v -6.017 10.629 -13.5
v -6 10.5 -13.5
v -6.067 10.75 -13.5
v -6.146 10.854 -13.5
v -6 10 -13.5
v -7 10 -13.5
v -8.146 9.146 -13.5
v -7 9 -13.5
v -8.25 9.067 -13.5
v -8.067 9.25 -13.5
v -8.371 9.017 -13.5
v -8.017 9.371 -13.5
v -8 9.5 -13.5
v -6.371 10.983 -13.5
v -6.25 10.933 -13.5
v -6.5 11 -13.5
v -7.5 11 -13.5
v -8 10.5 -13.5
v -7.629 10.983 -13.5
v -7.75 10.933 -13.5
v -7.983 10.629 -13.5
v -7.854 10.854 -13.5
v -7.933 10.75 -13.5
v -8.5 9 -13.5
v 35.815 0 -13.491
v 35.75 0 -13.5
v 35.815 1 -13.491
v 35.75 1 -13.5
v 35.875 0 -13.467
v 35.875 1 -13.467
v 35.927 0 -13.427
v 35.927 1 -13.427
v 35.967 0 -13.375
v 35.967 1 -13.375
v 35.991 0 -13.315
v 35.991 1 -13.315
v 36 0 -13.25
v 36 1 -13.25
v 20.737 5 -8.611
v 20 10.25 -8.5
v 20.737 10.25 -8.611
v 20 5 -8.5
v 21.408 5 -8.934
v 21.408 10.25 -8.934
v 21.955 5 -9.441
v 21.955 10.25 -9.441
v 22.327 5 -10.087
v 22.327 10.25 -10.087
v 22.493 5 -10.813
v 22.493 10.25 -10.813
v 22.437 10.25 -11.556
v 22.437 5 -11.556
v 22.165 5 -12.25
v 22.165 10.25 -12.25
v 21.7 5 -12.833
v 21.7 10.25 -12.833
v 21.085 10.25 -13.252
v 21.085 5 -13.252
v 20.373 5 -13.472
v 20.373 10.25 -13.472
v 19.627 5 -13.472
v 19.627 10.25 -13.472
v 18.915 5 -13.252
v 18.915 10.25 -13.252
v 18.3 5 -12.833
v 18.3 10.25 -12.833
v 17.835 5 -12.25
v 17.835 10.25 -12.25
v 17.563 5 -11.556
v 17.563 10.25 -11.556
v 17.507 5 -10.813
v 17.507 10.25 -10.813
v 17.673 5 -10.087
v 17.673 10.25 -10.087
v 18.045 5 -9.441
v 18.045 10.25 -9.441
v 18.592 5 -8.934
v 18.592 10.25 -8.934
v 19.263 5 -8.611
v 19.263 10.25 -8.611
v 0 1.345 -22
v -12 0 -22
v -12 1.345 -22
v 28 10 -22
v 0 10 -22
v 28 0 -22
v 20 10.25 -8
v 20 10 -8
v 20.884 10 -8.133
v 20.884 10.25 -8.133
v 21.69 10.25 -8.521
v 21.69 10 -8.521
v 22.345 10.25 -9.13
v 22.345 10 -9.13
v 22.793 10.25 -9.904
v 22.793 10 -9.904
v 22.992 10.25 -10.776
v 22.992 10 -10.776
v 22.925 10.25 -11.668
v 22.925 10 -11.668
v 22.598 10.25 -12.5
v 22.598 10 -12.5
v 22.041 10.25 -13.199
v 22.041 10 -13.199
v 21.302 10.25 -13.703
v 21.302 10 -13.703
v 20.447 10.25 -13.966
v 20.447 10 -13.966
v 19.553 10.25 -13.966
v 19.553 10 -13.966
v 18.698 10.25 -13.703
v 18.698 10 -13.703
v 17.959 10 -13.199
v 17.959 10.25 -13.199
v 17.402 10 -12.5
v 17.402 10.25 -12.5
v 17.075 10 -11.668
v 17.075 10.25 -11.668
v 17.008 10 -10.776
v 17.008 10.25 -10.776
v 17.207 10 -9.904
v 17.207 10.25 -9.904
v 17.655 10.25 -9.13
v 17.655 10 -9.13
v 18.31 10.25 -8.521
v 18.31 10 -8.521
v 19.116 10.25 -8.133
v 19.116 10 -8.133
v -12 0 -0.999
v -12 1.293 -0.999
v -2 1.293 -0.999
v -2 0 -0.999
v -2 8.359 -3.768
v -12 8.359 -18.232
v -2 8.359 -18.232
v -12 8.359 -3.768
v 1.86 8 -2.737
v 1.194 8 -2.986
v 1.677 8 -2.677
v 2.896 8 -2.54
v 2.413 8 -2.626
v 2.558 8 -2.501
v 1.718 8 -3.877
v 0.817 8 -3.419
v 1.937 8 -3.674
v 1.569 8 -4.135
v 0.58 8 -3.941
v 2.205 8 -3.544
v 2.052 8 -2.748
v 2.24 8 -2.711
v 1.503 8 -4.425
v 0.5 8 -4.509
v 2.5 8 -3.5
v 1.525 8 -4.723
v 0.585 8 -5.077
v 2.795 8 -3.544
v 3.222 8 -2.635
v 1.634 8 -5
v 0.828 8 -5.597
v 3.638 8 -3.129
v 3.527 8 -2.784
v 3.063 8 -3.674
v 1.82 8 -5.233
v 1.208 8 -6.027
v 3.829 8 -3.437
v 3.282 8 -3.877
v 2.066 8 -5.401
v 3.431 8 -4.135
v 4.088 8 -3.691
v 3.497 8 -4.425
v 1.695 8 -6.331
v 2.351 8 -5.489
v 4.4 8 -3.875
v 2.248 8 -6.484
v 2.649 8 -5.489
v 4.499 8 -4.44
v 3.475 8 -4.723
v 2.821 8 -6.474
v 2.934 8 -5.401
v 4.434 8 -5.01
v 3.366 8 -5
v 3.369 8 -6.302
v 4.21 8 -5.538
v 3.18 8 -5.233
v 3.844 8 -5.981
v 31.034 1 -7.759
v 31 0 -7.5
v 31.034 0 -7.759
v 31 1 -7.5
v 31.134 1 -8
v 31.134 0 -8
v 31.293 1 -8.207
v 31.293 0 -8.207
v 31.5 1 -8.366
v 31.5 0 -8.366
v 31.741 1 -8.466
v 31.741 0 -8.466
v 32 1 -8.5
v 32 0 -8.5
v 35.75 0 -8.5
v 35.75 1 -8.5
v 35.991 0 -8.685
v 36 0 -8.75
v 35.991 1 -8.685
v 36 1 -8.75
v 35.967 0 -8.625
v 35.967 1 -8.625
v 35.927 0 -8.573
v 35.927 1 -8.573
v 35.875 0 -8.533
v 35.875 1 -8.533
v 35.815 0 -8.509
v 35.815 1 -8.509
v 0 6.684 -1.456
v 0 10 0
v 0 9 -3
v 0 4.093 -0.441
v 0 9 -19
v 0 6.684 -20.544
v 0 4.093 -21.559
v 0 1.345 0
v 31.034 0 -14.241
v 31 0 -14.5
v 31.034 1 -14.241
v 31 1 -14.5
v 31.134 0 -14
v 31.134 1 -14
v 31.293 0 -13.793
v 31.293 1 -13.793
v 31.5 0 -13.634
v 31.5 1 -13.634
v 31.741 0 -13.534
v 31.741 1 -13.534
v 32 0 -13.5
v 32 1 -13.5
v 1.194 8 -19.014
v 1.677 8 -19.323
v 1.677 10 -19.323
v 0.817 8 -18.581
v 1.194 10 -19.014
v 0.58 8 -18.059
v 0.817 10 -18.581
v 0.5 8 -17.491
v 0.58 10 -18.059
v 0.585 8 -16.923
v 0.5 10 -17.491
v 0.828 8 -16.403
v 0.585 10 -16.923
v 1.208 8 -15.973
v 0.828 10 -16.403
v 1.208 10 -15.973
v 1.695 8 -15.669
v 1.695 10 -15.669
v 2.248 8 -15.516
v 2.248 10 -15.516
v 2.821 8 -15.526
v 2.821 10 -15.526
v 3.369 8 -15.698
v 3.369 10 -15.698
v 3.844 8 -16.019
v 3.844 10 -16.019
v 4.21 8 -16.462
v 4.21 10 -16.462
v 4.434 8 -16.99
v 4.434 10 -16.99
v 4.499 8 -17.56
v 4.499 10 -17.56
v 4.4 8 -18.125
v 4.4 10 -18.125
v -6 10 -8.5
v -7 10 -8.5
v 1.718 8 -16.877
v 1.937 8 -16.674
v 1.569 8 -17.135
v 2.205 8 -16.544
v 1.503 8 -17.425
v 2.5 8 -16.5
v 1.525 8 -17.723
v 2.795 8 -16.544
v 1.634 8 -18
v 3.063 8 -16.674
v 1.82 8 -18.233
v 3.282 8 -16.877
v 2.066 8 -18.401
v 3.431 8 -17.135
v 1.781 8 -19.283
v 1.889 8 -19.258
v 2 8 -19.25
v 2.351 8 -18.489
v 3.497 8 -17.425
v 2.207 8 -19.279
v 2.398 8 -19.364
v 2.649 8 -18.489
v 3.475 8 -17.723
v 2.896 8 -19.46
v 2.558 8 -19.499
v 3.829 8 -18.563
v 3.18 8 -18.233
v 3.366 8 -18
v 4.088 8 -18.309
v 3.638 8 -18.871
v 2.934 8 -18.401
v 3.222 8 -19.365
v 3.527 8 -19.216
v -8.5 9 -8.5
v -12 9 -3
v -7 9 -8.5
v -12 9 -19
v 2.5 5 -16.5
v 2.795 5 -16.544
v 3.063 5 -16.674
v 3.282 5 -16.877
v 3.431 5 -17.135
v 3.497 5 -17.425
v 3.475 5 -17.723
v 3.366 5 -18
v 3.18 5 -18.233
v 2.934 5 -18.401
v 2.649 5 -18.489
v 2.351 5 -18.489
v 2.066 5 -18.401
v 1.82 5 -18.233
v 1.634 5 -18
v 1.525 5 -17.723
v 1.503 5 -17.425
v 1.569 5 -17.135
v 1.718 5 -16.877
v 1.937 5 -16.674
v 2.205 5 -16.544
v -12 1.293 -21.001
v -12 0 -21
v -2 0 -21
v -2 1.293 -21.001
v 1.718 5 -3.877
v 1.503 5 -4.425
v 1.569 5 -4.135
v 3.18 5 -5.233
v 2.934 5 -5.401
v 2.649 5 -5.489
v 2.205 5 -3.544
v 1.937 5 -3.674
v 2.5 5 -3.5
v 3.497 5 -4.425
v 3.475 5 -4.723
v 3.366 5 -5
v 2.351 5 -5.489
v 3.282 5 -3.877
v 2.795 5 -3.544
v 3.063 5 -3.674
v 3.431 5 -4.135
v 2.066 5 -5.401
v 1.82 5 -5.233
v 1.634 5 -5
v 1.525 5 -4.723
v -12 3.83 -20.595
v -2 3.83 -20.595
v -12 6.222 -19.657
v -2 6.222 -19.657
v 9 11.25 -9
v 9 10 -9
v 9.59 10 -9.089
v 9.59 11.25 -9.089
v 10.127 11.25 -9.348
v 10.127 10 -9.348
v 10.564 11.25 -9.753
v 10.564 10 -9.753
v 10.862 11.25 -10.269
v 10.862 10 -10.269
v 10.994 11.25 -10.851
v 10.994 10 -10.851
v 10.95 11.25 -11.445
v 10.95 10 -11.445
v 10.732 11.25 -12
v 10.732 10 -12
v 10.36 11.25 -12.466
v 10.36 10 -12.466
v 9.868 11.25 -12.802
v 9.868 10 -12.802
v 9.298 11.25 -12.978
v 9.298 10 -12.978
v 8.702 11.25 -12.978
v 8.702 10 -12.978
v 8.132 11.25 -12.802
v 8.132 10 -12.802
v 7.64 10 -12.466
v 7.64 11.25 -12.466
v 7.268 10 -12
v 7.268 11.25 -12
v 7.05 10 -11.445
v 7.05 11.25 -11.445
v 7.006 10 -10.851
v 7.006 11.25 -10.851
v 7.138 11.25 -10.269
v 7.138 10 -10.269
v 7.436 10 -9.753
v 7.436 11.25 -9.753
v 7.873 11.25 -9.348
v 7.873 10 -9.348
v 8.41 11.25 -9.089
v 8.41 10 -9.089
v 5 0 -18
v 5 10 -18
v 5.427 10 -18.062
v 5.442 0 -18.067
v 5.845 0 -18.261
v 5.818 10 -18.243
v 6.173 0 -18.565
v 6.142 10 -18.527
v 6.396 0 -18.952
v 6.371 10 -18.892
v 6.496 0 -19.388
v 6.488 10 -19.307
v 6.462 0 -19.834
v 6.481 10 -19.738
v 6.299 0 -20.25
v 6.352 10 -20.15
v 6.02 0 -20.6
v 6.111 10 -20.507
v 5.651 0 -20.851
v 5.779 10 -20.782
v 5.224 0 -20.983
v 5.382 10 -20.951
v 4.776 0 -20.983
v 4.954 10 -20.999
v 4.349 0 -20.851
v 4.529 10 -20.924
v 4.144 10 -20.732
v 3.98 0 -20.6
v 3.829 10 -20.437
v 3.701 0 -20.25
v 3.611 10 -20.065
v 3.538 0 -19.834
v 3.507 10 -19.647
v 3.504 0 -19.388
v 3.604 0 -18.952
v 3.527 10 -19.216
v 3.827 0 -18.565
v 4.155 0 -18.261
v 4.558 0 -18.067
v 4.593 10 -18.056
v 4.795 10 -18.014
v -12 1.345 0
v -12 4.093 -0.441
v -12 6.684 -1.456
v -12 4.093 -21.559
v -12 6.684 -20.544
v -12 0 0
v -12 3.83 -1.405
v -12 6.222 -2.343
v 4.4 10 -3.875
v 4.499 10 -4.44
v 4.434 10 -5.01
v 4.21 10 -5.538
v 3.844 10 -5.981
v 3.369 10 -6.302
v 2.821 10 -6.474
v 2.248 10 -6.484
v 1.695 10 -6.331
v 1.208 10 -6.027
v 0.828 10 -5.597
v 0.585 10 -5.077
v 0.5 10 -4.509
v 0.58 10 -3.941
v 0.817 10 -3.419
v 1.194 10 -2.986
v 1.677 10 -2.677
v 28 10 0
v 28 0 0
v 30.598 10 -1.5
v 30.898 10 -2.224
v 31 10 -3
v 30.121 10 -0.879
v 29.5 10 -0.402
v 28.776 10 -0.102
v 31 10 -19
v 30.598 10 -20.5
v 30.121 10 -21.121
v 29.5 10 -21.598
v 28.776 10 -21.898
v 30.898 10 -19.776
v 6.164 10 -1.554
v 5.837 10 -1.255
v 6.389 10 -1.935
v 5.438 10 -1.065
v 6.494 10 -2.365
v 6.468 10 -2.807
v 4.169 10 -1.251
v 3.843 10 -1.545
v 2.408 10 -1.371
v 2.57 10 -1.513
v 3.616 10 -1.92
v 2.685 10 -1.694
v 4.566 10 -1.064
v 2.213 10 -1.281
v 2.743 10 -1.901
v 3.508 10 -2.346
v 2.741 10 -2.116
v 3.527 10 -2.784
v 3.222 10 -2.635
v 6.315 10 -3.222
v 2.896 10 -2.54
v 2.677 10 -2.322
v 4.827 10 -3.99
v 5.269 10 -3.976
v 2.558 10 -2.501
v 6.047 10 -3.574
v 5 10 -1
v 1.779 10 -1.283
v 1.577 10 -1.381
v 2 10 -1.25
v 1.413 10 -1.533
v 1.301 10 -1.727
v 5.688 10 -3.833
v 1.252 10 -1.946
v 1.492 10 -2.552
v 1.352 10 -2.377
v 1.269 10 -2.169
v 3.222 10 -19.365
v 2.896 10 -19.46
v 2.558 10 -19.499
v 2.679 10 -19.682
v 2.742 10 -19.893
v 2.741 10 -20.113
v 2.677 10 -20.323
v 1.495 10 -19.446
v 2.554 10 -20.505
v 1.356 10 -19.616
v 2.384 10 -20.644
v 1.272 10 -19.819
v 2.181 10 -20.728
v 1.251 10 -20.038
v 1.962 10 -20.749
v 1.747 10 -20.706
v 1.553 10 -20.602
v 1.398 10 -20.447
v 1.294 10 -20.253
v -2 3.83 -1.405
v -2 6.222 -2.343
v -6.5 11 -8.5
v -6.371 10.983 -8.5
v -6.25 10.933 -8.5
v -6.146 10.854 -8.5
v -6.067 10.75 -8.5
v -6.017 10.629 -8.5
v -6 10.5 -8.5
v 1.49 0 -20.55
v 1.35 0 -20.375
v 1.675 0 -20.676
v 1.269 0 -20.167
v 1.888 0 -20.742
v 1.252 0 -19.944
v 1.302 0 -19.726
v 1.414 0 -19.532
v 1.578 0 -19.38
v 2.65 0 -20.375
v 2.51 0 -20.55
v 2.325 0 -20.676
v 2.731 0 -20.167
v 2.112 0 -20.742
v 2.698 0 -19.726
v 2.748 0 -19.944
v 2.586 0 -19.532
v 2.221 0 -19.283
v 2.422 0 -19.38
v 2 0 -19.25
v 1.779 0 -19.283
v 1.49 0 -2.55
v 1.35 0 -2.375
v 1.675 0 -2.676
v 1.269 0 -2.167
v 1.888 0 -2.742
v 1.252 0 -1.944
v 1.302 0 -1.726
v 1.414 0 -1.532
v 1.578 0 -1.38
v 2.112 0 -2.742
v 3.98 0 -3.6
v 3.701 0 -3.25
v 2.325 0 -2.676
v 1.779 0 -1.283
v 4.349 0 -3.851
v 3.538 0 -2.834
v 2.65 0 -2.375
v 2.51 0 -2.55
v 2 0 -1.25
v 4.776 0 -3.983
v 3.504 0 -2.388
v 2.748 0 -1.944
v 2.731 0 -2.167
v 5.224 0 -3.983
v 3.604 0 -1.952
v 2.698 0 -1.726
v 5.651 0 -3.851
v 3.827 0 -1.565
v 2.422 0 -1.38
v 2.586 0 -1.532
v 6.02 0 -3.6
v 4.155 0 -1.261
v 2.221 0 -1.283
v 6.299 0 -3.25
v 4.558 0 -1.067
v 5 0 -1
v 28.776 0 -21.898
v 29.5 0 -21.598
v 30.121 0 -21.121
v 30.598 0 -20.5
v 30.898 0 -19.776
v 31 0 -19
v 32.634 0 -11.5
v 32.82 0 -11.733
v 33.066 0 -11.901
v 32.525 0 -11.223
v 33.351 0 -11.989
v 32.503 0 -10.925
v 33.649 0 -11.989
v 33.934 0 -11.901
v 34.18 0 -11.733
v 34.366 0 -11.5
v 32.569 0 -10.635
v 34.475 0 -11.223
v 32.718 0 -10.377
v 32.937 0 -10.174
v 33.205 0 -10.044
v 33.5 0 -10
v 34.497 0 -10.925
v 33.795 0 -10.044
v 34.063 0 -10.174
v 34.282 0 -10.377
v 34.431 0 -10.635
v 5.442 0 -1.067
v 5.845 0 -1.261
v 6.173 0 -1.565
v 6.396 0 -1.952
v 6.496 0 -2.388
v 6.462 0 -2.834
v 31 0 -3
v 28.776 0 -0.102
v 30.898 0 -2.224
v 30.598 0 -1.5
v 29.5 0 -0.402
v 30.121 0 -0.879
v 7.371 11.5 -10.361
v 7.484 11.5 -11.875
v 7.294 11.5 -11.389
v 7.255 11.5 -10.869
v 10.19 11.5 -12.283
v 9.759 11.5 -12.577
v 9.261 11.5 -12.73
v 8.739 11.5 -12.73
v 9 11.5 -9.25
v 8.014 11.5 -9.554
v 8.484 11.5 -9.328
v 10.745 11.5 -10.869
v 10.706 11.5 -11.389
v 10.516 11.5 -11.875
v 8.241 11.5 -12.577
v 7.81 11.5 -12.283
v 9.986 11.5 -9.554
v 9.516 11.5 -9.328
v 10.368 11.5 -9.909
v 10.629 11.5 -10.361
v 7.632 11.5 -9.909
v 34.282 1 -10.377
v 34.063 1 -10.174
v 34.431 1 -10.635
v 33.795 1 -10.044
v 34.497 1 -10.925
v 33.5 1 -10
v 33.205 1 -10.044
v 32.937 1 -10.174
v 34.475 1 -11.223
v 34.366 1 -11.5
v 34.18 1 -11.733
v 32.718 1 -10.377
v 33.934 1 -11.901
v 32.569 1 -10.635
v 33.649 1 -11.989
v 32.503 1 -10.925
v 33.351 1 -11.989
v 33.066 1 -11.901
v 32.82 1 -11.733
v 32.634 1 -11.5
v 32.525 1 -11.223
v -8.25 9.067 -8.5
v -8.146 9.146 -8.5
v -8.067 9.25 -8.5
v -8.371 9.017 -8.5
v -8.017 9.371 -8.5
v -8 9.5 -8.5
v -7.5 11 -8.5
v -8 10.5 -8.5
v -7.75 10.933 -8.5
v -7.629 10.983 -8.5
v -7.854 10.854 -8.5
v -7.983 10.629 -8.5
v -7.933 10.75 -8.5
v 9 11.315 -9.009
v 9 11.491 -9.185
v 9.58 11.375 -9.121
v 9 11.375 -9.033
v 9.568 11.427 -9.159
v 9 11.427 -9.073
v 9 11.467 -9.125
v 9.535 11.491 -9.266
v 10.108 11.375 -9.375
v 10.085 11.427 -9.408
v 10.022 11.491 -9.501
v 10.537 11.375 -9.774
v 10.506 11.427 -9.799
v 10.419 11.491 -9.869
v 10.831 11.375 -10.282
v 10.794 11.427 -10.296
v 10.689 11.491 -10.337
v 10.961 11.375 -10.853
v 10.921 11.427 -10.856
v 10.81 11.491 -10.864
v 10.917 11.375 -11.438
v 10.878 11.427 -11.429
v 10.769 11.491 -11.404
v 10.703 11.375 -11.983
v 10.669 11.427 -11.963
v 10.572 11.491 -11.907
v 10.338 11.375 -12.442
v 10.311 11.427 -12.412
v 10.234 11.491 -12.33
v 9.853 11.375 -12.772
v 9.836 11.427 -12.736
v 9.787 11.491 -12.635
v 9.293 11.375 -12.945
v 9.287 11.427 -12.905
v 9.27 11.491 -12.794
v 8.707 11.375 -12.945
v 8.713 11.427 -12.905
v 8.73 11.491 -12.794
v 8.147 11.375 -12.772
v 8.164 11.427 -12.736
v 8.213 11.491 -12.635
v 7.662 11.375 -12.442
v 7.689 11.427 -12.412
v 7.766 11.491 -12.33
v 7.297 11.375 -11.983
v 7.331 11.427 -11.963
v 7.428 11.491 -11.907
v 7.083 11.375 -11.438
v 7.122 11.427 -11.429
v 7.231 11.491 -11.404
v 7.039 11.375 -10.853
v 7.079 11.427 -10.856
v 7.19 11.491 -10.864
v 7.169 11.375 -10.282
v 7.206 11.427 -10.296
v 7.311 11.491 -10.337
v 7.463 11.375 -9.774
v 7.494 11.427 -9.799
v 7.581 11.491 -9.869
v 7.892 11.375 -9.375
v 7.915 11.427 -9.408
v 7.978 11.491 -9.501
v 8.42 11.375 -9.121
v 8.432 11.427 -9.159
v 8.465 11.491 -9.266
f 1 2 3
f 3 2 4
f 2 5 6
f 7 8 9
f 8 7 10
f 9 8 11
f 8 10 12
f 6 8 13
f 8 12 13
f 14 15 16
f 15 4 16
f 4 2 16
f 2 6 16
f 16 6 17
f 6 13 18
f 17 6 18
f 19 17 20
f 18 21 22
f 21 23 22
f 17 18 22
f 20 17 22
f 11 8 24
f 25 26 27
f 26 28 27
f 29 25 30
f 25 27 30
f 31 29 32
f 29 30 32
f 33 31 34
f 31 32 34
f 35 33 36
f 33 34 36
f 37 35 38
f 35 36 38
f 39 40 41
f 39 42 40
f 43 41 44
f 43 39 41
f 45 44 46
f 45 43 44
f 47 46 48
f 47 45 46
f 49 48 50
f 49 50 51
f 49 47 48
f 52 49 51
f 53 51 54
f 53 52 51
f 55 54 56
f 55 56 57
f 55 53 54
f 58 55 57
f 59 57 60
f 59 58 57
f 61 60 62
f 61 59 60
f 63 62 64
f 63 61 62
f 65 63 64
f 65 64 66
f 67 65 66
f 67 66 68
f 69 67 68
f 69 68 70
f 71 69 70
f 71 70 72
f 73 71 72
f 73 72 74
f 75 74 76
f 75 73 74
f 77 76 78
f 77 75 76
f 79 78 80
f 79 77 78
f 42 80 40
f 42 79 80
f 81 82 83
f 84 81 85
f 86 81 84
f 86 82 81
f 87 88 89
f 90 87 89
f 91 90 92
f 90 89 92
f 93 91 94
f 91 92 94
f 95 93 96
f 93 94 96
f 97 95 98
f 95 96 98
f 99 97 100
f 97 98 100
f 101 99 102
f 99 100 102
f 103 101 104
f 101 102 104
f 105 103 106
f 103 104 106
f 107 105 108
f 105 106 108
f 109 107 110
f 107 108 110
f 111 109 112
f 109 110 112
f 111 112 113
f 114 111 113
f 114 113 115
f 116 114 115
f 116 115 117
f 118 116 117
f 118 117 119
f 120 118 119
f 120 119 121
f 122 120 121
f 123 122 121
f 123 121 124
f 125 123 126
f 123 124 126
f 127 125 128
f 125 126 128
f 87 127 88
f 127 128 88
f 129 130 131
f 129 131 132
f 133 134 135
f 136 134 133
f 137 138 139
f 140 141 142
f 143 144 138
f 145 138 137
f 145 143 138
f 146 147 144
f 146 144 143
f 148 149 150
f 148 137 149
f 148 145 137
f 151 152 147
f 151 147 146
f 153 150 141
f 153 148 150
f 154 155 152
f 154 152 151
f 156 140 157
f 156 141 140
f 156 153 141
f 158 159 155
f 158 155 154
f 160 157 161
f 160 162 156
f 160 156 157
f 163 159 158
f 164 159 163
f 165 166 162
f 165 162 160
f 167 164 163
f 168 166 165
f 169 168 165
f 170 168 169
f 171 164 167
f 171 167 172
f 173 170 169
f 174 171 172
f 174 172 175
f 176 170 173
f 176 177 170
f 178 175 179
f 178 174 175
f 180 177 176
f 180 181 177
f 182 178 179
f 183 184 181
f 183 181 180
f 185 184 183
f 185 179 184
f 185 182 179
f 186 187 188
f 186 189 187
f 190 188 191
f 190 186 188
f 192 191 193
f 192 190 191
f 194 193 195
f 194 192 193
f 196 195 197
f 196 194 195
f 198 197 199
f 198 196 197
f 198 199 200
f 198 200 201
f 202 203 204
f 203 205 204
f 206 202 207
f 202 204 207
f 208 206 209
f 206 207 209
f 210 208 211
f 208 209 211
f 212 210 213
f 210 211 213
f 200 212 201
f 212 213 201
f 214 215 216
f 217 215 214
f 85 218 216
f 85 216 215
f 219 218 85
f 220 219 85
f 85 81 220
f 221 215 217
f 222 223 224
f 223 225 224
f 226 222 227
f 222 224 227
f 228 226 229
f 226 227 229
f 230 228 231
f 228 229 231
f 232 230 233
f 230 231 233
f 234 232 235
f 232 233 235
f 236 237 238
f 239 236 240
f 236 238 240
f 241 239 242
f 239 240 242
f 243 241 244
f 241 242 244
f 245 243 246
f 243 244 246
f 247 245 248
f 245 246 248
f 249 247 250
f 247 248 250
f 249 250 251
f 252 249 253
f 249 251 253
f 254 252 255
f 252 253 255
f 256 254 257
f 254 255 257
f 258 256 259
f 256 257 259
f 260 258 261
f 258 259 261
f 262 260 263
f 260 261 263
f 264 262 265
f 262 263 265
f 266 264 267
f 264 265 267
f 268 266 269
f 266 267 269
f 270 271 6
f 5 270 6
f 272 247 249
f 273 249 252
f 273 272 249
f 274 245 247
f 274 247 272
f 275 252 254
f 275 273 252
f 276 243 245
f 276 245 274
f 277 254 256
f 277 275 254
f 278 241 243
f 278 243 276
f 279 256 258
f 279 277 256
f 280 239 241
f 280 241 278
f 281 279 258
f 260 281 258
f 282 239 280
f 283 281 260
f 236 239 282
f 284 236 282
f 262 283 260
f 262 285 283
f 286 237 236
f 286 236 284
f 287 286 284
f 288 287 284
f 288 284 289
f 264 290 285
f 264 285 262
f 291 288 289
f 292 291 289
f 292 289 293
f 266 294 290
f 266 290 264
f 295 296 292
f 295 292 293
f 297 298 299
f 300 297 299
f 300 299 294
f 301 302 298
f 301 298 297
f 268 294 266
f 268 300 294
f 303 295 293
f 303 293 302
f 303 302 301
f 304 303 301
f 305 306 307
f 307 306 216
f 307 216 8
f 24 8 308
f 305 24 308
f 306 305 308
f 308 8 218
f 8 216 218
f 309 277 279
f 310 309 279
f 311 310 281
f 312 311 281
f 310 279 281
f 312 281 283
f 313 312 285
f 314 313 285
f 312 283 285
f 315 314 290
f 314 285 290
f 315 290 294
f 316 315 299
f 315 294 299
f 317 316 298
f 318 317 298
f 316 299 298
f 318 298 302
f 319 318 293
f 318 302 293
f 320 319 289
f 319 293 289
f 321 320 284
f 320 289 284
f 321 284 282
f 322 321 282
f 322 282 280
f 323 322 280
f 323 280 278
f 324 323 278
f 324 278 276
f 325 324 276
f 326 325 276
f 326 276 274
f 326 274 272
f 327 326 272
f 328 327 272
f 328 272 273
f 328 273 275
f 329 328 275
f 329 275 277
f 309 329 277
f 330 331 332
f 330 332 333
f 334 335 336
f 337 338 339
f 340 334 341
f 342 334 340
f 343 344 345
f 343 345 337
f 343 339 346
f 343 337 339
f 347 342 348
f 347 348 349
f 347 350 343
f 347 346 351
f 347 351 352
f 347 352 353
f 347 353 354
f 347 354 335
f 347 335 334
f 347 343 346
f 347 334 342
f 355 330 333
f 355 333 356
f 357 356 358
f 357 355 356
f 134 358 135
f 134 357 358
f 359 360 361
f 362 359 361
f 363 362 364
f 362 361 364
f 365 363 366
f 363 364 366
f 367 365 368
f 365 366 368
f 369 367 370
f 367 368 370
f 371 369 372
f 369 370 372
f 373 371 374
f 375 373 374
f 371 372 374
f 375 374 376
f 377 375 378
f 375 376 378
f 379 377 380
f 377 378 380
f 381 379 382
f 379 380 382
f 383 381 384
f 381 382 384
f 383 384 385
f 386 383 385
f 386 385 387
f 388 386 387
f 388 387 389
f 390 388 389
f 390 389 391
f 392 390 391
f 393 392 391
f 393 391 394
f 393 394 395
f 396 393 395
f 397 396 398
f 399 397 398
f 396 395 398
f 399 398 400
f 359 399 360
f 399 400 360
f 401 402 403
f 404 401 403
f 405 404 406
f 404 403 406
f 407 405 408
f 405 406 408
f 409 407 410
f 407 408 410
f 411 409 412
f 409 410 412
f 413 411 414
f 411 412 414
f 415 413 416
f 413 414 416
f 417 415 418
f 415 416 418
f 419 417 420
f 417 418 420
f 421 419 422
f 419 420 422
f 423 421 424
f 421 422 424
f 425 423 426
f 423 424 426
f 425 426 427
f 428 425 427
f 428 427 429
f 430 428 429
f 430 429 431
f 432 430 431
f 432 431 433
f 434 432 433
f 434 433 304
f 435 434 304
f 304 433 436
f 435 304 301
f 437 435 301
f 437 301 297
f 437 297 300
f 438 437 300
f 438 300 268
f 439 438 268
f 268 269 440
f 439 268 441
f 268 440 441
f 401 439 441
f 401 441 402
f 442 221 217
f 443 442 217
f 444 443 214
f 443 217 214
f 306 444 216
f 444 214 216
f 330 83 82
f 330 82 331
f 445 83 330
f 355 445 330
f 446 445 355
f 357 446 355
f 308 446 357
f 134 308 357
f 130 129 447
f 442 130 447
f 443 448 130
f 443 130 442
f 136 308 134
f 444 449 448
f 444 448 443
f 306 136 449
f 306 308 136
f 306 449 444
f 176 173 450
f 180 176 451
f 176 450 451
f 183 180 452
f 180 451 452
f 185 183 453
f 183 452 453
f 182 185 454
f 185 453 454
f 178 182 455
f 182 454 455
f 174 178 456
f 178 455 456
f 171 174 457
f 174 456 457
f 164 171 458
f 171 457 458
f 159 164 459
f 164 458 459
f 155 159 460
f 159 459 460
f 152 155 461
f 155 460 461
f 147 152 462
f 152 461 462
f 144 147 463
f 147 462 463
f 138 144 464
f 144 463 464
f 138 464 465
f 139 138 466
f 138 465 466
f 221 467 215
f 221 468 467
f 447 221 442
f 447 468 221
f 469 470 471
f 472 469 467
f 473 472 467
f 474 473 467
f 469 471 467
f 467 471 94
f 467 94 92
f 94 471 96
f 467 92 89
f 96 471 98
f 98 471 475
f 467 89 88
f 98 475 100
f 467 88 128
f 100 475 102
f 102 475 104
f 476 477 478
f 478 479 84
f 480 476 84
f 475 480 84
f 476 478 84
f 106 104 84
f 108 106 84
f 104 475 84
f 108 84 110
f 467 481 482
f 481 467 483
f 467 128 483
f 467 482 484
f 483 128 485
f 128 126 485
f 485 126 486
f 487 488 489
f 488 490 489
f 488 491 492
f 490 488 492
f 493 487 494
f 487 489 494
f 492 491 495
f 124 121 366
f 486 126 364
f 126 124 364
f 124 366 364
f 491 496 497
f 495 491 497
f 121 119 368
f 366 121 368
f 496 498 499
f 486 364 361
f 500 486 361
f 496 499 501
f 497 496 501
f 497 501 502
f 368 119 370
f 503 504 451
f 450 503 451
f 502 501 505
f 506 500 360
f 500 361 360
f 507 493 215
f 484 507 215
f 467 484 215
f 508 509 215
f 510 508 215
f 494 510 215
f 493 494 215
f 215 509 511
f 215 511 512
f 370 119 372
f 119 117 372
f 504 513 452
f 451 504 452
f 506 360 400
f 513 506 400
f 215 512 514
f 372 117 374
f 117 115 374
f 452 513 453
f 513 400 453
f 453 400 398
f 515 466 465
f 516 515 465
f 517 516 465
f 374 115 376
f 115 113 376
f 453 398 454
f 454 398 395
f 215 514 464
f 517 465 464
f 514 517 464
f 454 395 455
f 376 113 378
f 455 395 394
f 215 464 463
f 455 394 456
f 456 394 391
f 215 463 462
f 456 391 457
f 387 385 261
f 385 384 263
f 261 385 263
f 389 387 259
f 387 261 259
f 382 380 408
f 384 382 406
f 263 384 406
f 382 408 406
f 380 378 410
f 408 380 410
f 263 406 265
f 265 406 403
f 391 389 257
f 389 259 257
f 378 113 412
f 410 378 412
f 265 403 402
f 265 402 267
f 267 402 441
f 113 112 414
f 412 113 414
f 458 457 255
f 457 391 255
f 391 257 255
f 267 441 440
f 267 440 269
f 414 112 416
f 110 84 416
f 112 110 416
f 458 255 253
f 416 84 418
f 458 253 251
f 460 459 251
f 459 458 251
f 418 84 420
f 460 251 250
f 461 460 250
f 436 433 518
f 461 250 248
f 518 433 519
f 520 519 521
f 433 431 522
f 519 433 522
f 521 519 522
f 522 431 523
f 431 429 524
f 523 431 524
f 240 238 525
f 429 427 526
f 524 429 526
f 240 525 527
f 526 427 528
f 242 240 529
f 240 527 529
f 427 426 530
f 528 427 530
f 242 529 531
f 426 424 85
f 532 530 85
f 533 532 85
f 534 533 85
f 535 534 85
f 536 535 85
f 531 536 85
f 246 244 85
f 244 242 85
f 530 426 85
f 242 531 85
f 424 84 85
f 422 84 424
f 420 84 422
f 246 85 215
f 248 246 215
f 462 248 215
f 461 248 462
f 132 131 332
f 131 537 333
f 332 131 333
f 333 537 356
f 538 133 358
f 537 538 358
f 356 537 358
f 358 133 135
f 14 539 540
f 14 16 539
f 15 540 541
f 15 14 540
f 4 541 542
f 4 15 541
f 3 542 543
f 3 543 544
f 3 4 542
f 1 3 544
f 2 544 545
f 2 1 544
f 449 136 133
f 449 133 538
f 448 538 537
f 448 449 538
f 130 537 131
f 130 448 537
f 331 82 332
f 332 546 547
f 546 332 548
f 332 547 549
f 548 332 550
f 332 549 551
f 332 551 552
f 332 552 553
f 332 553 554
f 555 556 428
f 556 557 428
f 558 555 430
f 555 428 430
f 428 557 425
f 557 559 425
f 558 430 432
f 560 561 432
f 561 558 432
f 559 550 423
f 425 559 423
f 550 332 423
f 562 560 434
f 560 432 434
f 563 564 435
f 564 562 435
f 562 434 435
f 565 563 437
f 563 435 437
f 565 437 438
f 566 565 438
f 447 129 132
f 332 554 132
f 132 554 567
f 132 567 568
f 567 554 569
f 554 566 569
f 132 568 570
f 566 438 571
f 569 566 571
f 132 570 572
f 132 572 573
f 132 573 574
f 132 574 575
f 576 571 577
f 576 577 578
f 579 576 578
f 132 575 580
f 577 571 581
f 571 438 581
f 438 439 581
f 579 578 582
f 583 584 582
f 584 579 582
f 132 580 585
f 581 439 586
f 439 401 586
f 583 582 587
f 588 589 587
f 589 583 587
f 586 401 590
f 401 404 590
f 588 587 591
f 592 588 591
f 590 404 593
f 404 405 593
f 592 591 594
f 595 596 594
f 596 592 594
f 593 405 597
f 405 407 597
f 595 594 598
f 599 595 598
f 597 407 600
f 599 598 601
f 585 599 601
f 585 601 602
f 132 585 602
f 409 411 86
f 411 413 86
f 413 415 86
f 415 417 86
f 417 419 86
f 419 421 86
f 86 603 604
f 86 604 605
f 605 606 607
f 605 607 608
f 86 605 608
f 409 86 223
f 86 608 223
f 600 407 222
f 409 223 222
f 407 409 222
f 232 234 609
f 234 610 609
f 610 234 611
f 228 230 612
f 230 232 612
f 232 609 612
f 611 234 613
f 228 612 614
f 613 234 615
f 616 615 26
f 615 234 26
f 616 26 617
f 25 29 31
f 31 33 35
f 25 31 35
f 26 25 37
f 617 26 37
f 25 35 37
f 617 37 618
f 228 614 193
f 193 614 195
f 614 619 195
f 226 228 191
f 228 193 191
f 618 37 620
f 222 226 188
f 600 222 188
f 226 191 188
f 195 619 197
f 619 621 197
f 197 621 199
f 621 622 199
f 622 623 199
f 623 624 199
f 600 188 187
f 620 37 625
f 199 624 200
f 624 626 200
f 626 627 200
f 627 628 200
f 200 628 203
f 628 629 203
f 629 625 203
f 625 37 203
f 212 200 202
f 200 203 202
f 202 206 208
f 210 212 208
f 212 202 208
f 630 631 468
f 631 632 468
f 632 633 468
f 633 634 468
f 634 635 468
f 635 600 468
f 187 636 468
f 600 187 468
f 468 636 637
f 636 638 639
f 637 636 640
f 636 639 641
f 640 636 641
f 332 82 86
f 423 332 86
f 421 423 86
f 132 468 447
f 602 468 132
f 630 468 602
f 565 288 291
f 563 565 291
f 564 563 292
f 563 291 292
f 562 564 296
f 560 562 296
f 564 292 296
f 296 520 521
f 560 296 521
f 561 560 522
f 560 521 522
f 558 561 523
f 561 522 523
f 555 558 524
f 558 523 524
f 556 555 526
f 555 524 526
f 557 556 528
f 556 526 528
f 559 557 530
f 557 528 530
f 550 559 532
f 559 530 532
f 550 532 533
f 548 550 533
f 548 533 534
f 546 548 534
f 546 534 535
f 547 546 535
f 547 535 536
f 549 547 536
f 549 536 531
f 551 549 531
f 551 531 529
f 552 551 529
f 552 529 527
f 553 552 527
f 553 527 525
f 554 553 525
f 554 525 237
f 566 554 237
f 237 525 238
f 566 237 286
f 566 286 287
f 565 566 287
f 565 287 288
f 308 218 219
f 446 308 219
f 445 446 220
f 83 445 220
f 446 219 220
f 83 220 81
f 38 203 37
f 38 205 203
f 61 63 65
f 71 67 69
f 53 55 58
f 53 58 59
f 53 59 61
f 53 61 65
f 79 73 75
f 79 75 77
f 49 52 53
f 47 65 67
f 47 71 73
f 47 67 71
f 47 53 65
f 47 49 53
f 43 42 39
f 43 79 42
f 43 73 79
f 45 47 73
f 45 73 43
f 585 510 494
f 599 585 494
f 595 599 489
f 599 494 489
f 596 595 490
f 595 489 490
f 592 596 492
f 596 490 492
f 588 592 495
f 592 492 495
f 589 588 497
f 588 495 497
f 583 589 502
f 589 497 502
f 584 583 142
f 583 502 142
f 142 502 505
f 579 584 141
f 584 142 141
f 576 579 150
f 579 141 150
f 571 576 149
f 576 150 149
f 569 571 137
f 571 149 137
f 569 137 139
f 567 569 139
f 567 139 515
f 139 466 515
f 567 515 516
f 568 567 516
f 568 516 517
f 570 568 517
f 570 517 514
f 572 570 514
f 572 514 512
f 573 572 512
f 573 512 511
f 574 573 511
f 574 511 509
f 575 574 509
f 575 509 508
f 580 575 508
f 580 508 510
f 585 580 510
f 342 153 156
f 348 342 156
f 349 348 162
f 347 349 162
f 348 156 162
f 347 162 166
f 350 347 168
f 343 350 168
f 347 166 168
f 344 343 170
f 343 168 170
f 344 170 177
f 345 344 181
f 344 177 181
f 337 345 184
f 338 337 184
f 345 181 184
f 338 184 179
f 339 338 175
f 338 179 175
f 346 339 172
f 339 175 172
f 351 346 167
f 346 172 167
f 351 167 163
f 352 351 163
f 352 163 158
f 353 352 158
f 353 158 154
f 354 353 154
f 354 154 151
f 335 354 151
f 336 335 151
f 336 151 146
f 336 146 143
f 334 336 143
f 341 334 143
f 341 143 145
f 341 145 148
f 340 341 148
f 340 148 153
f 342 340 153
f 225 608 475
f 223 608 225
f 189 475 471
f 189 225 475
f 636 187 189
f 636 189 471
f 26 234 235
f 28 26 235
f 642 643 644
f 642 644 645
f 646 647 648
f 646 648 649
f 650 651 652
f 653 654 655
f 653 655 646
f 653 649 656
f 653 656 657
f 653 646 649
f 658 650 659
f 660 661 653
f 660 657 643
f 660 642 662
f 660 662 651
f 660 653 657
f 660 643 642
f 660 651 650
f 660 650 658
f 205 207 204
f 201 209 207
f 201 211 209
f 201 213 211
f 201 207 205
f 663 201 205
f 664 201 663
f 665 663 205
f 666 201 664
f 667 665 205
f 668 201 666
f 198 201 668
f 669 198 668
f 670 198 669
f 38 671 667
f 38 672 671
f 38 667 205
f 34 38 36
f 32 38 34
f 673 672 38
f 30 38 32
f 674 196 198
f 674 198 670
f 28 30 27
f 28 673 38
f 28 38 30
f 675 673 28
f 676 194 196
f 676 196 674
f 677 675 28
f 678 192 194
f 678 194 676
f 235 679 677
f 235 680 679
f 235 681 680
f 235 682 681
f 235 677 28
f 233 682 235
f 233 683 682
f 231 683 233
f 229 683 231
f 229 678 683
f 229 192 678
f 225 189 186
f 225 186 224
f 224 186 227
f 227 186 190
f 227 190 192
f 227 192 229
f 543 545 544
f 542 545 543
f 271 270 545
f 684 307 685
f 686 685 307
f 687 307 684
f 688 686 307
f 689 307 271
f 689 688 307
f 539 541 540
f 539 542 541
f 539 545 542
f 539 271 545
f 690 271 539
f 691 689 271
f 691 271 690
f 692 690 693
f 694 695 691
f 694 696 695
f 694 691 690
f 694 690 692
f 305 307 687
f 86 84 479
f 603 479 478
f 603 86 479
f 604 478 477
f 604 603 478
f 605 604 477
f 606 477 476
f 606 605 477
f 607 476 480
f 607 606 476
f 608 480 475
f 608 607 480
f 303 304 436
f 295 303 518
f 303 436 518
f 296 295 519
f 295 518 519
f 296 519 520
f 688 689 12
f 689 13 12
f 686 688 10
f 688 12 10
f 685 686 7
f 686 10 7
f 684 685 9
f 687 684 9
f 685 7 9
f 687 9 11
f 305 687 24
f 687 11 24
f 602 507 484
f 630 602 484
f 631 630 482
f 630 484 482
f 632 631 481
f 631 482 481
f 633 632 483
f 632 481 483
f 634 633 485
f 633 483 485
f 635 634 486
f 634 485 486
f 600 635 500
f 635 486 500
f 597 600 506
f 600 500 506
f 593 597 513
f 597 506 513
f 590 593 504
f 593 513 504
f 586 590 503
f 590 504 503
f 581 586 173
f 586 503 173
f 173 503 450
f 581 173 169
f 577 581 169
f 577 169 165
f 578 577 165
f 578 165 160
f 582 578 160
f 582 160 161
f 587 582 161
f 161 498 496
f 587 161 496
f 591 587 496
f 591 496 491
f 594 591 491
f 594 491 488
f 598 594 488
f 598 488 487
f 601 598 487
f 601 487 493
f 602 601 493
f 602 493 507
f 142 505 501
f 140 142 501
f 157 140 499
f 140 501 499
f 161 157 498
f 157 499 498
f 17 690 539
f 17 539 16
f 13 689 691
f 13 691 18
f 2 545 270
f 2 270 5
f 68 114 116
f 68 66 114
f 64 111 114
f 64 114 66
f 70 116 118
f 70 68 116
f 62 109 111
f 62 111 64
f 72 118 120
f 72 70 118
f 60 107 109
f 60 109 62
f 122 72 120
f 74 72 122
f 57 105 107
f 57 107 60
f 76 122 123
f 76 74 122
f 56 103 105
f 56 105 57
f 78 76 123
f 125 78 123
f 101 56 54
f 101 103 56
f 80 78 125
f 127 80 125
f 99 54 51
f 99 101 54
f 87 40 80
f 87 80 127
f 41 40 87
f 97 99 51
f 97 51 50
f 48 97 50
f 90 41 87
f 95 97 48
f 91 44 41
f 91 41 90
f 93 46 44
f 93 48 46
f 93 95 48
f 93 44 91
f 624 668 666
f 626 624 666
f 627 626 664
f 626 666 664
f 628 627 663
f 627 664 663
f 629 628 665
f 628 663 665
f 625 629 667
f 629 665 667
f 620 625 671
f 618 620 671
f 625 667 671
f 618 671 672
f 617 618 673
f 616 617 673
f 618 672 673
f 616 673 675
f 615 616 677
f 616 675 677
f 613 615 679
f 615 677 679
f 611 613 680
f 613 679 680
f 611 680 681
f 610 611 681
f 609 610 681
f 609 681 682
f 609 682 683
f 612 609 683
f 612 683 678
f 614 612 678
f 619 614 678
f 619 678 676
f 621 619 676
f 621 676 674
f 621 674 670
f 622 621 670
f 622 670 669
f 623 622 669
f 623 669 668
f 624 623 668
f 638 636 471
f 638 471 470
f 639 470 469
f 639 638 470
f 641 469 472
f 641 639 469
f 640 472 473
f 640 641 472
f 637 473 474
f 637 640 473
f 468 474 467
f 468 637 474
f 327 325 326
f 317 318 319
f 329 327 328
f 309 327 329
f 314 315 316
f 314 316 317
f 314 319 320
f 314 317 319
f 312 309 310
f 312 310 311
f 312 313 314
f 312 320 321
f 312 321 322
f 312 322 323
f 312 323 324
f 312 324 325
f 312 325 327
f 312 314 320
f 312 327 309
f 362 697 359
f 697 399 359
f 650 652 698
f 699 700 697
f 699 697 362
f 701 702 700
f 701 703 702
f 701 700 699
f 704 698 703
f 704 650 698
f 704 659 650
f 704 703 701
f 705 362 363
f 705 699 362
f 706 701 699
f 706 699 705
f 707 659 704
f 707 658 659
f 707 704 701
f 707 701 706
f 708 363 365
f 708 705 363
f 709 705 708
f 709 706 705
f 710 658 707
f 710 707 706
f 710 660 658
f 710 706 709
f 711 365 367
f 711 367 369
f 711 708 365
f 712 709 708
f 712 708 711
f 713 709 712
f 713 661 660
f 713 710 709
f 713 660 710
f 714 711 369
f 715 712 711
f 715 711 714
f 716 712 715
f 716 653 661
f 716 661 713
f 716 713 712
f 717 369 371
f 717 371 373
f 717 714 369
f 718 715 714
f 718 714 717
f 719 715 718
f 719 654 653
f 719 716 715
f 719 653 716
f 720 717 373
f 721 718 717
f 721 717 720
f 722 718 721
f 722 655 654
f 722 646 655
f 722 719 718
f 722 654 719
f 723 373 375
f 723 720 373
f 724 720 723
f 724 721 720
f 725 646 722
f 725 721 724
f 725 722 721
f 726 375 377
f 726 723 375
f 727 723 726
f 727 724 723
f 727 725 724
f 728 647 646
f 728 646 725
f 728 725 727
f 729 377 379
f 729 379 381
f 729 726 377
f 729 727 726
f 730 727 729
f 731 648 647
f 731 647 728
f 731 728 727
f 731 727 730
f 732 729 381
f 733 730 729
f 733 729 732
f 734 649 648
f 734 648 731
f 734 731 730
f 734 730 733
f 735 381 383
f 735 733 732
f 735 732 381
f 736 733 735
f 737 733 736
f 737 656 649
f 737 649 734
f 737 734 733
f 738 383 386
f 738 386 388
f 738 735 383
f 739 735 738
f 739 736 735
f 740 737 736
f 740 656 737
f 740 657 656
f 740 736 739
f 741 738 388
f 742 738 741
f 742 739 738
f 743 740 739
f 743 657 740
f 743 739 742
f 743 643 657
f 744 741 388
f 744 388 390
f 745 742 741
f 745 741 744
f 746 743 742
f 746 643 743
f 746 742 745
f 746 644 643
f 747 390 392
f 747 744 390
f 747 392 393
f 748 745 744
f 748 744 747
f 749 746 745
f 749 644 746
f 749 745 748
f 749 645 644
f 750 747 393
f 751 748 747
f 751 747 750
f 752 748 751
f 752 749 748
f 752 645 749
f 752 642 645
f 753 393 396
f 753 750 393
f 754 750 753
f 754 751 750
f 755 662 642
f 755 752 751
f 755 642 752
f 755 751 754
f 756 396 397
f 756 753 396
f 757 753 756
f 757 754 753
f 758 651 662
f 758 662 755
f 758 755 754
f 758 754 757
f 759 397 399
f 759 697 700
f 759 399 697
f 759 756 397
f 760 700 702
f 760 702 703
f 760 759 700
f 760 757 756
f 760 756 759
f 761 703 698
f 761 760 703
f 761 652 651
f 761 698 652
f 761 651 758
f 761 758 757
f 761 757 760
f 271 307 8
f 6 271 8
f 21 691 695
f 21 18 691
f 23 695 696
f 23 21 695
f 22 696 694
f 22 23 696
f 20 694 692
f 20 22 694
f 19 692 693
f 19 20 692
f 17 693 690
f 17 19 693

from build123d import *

# Parameters (mm, degrees)
BOSS_EXTRUDE2_DEPTH     = 9
SKETCH4_W               = 5
SKETCH4_H               = 1
BOSS_EXTRUDE3_DEPTH     = 5
SKETCH5_R               = 1
CUT_EXTRUDE1_DEPTH      = 5
FILLET1_R               = 1
FILLET2_R               = 1
FILLET3_R               = 3
FILLET4_R               = 3
BOSS_EXTRUDE4_DEPTH     = 12
FILLET6_R               = 0.25
SKETCH10_R              = 1.5
CUT_EXTRUDE7_DEPTH      = 44.13930922
CUT_EXTRUDE7_DEPTH_BACK = 44.13930922
SKETCH12_R              = 0.75
CUT_EXTRUDE8_DEPTH      = 3
SKETCH13_W              = 1
SKETCH13_H              = 5
BOSS_EXTRUDE5_DEPTH     = 2
SKETCH14_W              = 5
SKETCH14_H              = 1
BOSS_EXTRUDE6_DEPTH     = 1
FILLET7_R               = 0.5
FILLET8_R               = 0.5
FILLET9_R               = 0.5
CUT_EXTRUDE9_DEPTH      = 10
BOSS_EXTRUDE7_DEPTH     = 1
SKETCH18_R              = 1.5
CUT_EXTRUDE12_DEPTH     = 44.358966777
SKETCH19_R              = 0.75
CUT_EXTRUDE14_DEPTH     = 44.358966777
SKETCH20_R              = 2
BOSS_EXTRUDE8_DEPTH     = 1.5
FILLET10_R              = 0.25
SKETCH21_R              = 2.5
CUT_EXTRUDE15_DEPTH     = 5
SKETCH22_R              = 3
SKETCH22_R_2            = 2.5
BOSS_EXTRUDE9_DEPTH     = 0.25
SKETCH24_R              = 2
CUT_EXTRUDE16_DEPTH     = 2
SKETCH25_R              = 1
CUT_EXTRUDE17_DEPTH     = 5


with BuildPart() as part:
    # Sketch2 → Boss-Extrude2 (new body)
    with BuildSketch(Plane(origin=(0, 0, 0), x_dir=(1, 0, 0), z_dir=(0, 1, 0))):
        Polygon((0, 11), (31, 11), (31, 13.5), (31, 22), (0, 22), align=None)
        Polygon((31, 8.5), (31, 11), (0, 11), (0, 0), (31, 0), align=None)
    extrude(amount=BOSS_EXTRUDE2_DEPTH)

    # Sketch4 → Boss-Extrude3 (add)
    with BuildSketch(Plane(origin=(31, 0, 0), x_dir=(0, 0, -1), z_dir=(1, 0, 0))):
        with Locations((11, 0.5)):
            Rectangle(SKETCH4_W, SKETCH4_H)
    extrude(amount=BOSS_EXTRUDE3_DEPTH)

    # Sketch5 → Cut-Extrude1 (cut)
    with BuildSketch(Plane(origin=(0, 1, 0), x_dir=(1, 0, 0), z_dir=(0, 1, 0))):
        with Locations(Location((33.5, 11, 0), (0, 0, 270))):
            Circle(SKETCH5_R)
    extrude(amount=-CUT_EXTRUDE1_DEPTH, mode=Mode.SUBTRACT)

    # Fillet1
    fillet1_edges = [part.edges().sort_by_distance(p)[0] for p in [
        (31, 0.5, -8.5),
    ]]
    fillet(fillet1_edges, radius=FILLET1_R)

    # Fillet2
    fillet2_edges = [part.edges().sort_by_distance(p)[0] for p in [
        (31, 0.5, -13.5),
    ]]
    fillet(fillet2_edges, radius=FILLET2_R)

    # Fillet3
    fillet3_edges = [part.edges().sort_by_distance(p)[0] for p in [
        (31, 4.5, 0),
    ]]
    fillet(fillet3_edges, radius=FILLET3_R)

    # Fillet4
    fillet4_edges = [part.edges().sort_by_distance(p)[0] for p in [
        (31, 4.5, -22),
    ]]
    fillet(fillet4_edges, radius=FILLET4_R)

    # Sketch6 → Boss-Extrude4 (add)
    with BuildSketch(Plane.ZY):
        with BuildLine():
            Line((-22, 0), (-11, 0))
            Line((-11, 0), (-11, 9))
            Line((-11, 9), (-19, 9))
            ThreePointArc((-19, 9), (-21.121122912, 5.415884648), (-22, 1.344936316))
            Line((-22, 1.344936316), (-22, 0))
        make_face()
        with BuildLine():
            Line((-11, 9), (-11, 0))
            Line((-11, 0), (0, 0))
            Line((0, 0), (0, 1.344936316))
            ThreePointArc((0, 1.344936316), (-0.878877088, 5.415884648), (-3, 9))
            Line((-3, 9), (-11, 9))
        make_face()
    extrude(amount=BOSS_EXTRUDE4_DEPTH)

    # Fillet6
    fillet6_edges = [part.edges().sort_by_distance(p)[0] for p in [
        (36, 0.5, -13.5),
        (36, 0.5, -8.5),
    ]]
    fillet(fillet6_edges, radius=FILLET6_R)

    # Sketch10 → Cut-Extrude7 (cut, two sides)
    with BuildSketch(Plane(origin=(0, 9, 0), x_dir=(1, 0, 0), z_dir=(0, 1, 0))) as cut_extrude7_sk:
        with Locations(Location((5, 19.5, 0), (0, 0, 270))):
            Circle(SKETCH10_R)
        with Locations(Location((5, 2.5, 0), (0, 0, 270))):
            Circle(SKETCH10_R)
    extrude(amount=CUT_EXTRUDE7_DEPTH, mode=Mode.SUBTRACT)
    extrude(cut_extrude7_sk.sketch, amount=-CUT_EXTRUDE7_DEPTH_BACK, mode=Mode.SUBTRACT)

    # Sketch12 → Cut-Extrude8 (cut)
    with BuildSketch(Plane(origin=(0, 9, 0), x_dir=(1, 0, 0), z_dir=(0, 1, 0))):
        with Locations(Location((2, 2, 0), (0, 0, 270))):
            Circle(SKETCH12_R)
        with Locations(Location((2, 20, 0), (0, 0, 270))):
            Circle(SKETCH12_R)
    extrude(amount=-CUT_EXTRUDE8_DEPTH, mode=Mode.SUBTRACT)

    # Sketch13 → Boss-Extrude5 (add)
    with BuildSketch(Plane(origin=(0, 9, 0), x_dir=(1, 0, 0), z_dir=(0, 1, 0))):
        with Locations((-7.5, 11)):
            Rectangle(SKETCH13_W, SKETCH13_H)
    extrude(amount=BOSS_EXTRUDE5_DEPTH)

    # Sketch14 → Boss-Extrude6 (add)
    with BuildSketch(Plane(origin=(-7, 0, 0), x_dir=(0, 0, -1), z_dir=(1, 0, 0))):
        with Locations((11, 10.5)):
            Rectangle(SKETCH14_W, SKETCH14_H)
    extrude(amount=BOSS_EXTRUDE6_DEPTH)

    # Fillet7
    fillet7_edges = [part.edges().sort_by_distance(p)[0] for p in [
        (-8, 11, -11),
    ]]
    fillet(fillet7_edges, radius=FILLET7_R)

    # Fillet8
    fillet8_edges = [part.edges().sort_by_distance(p)[0] for p in [
        (-8, 9, -11),
    ]]
    fillet(fillet8_edges, radius=FILLET8_R)

    # Fillet9
    fillet9_edges = [part.edges().sort_by_distance(p)[0] for p in [
        (-6, 11, -11),
    ]]
    fillet(fillet9_edges, radius=FILLET9_R)

    # Sketch16 → Cut-Extrude9 (cut)
    with BuildSketch(Plane.ZY.offset(12)):
        with BuildLine():
            Line((-18.232108037, 8.359420628), (-3.767891963, 8.359420628))
            ThreePointArc((-3.767891963, 8.359420628), (-1.809932353, 5.051006457), (-0.998661194, 1.293207997))
            Line((-0.998661194, 1.293207997), (-0.998661194, 0))
            Line((-0.998661194, 0), (-21, 0))
            Line((-21, 0), (-21.001338806, 1.293207997))
            ThreePointArc((-21.001338806, 1.293207997), (-20.190067647, 5.051006457), (-18.232108037, 8.359420628))
        make_face()
    extrude(amount=-CUT_EXTRUDE9_DEPTH, mode=Mode.SUBTRACT)

    # Sketch17 → Boss-Extrude7 (add)
    with BuildSketch(Plane(origin=(0, 9, 0), x_dir=(1, 0, 0), z_dir=(0, 1, 0))):
        with BuildLine():
            Line((0, 3), (0, 19))
            Line((0, 19), (0, 22))
            Line((0, 22), (28, 22))
            ThreePointArc((28, 22), (30.121320344, 21.121320344), (31, 19))
            Line((31, 19), (31, 3))
            ThreePointArc((31, 3), (30.121320344, 0.878679656), (28, 0))
            Line((28, 0), (0, 0))
            Line((0, 0), (0, 3))
        make_face()
    extrude(amount=BOSS_EXTRUDE7_DEPTH)

    # Sketch18 → Cut-Extrude12 (cut, through all)
    with BuildSketch(Plane(origin=(0, 10, 0), x_dir=(1, 0, 0), z_dir=(0, 1, 0))):
        with Locations(Location((5, 19.5, 0), (0, 0, 270))):
            Circle(SKETCH18_R)
        with Locations(Location((5, 2.5, 0), (0, 0, 270))):
            Circle(SKETCH18_R)
    extrude(amount=-CUT_EXTRUDE12_DEPTH, mode=Mode.SUBTRACT)

    # Sketch19 → Cut-Extrude14 (cut, through all)
    with BuildSketch(Plane(origin=(0, 10, 0), x_dir=(1, 0, 0), z_dir=(0, 1, 0))):
        with Locations(Location((2, 20, 0), (0, 0, 270))):
            Circle(SKETCH19_R)
        with Locations(Location((2, 2, 0), (0, 0, 270))):
            Circle(SKETCH19_R)
    extrude(amount=-CUT_EXTRUDE14_DEPTH, mode=Mode.SUBTRACT)

    # Sketch20 → Boss-Extrude8 (add)
    with BuildSketch(Plane(origin=(0, 10, 0), x_dir=(1, 0, 0), z_dir=(0, 1, 0))):
        with Locations(Location((9, 11, 0), (0, 0, 270))):
            Circle(SKETCH20_R)
    extrude(amount=BOSS_EXTRUDE8_DEPTH)

    # Fillet10
    fillet10_edges = [part.edges().sort_by_distance(p)[0] for p in [
        (9, 11.5, -13),
    ]]
    fillet(fillet10_edges, radius=FILLET10_R)

    # Sketch21 → Cut-Extrude15 (cut)
    with BuildSketch(Plane(origin=(0, 10, 0), x_dir=(1, 0, 0), z_dir=(0, 1, 0))):
        with Locations(Location((20, 11, 0), (0, 0, 270))):
            Circle(SKETCH21_R)
    extrude(amount=-CUT_EXTRUDE15_DEPTH, mode=Mode.SUBTRACT)

    # Sketch22 → Boss-Extrude9 (add)
    with BuildSketch(Plane(origin=(0, 10, 0), x_dir=(1, 0, 0), z_dir=(0, 1, 0))):
        with Locations(Location((20, 11, 0), (0, 0, 270))):
            Circle(SKETCH22_R)
        with Locations(Location((20, 11, 0), (0, 0, 270))):
            Circle(SKETCH22_R_2, mode=Mode.SUBTRACT)
    extrude(amount=BOSS_EXTRUDE9_DEPTH)

    # Sketch24 → Cut-Extrude16 (cut)
    with BuildSketch(Plane(origin=(0, 10, 0), x_dir=(1, 0, 0), z_dir=(0, 1, 0))):
        with Locations((2.5, 17.5)):
            Circle(SKETCH24_R)
        with Locations((2.5, 4.5)):
            Circle(SKETCH24_R)
    extrude(amount=-CUT_EXTRUDE16_DEPTH, mode=Mode.SUBTRACT)

    # Sketch25 → Cut-Extrude17 (cut)
    with BuildSketch(Plane(origin=(0, 10, 0), x_dir=(1, 0, 0), z_dir=(0, 1, 0))):
        with Locations(Location((2.5, 17.5, 0), (0, 0, 270))):
            Circle(SKETCH25_R)
        with Locations(Location((2.5, 4.5, 0), (0, 0, 270))):
            Circle(SKETCH25_R)
    extrude(amount=-CUT_EXTRUDE17_DEPTH, mode=Mode.SUBTRACT)


solid = part.part
